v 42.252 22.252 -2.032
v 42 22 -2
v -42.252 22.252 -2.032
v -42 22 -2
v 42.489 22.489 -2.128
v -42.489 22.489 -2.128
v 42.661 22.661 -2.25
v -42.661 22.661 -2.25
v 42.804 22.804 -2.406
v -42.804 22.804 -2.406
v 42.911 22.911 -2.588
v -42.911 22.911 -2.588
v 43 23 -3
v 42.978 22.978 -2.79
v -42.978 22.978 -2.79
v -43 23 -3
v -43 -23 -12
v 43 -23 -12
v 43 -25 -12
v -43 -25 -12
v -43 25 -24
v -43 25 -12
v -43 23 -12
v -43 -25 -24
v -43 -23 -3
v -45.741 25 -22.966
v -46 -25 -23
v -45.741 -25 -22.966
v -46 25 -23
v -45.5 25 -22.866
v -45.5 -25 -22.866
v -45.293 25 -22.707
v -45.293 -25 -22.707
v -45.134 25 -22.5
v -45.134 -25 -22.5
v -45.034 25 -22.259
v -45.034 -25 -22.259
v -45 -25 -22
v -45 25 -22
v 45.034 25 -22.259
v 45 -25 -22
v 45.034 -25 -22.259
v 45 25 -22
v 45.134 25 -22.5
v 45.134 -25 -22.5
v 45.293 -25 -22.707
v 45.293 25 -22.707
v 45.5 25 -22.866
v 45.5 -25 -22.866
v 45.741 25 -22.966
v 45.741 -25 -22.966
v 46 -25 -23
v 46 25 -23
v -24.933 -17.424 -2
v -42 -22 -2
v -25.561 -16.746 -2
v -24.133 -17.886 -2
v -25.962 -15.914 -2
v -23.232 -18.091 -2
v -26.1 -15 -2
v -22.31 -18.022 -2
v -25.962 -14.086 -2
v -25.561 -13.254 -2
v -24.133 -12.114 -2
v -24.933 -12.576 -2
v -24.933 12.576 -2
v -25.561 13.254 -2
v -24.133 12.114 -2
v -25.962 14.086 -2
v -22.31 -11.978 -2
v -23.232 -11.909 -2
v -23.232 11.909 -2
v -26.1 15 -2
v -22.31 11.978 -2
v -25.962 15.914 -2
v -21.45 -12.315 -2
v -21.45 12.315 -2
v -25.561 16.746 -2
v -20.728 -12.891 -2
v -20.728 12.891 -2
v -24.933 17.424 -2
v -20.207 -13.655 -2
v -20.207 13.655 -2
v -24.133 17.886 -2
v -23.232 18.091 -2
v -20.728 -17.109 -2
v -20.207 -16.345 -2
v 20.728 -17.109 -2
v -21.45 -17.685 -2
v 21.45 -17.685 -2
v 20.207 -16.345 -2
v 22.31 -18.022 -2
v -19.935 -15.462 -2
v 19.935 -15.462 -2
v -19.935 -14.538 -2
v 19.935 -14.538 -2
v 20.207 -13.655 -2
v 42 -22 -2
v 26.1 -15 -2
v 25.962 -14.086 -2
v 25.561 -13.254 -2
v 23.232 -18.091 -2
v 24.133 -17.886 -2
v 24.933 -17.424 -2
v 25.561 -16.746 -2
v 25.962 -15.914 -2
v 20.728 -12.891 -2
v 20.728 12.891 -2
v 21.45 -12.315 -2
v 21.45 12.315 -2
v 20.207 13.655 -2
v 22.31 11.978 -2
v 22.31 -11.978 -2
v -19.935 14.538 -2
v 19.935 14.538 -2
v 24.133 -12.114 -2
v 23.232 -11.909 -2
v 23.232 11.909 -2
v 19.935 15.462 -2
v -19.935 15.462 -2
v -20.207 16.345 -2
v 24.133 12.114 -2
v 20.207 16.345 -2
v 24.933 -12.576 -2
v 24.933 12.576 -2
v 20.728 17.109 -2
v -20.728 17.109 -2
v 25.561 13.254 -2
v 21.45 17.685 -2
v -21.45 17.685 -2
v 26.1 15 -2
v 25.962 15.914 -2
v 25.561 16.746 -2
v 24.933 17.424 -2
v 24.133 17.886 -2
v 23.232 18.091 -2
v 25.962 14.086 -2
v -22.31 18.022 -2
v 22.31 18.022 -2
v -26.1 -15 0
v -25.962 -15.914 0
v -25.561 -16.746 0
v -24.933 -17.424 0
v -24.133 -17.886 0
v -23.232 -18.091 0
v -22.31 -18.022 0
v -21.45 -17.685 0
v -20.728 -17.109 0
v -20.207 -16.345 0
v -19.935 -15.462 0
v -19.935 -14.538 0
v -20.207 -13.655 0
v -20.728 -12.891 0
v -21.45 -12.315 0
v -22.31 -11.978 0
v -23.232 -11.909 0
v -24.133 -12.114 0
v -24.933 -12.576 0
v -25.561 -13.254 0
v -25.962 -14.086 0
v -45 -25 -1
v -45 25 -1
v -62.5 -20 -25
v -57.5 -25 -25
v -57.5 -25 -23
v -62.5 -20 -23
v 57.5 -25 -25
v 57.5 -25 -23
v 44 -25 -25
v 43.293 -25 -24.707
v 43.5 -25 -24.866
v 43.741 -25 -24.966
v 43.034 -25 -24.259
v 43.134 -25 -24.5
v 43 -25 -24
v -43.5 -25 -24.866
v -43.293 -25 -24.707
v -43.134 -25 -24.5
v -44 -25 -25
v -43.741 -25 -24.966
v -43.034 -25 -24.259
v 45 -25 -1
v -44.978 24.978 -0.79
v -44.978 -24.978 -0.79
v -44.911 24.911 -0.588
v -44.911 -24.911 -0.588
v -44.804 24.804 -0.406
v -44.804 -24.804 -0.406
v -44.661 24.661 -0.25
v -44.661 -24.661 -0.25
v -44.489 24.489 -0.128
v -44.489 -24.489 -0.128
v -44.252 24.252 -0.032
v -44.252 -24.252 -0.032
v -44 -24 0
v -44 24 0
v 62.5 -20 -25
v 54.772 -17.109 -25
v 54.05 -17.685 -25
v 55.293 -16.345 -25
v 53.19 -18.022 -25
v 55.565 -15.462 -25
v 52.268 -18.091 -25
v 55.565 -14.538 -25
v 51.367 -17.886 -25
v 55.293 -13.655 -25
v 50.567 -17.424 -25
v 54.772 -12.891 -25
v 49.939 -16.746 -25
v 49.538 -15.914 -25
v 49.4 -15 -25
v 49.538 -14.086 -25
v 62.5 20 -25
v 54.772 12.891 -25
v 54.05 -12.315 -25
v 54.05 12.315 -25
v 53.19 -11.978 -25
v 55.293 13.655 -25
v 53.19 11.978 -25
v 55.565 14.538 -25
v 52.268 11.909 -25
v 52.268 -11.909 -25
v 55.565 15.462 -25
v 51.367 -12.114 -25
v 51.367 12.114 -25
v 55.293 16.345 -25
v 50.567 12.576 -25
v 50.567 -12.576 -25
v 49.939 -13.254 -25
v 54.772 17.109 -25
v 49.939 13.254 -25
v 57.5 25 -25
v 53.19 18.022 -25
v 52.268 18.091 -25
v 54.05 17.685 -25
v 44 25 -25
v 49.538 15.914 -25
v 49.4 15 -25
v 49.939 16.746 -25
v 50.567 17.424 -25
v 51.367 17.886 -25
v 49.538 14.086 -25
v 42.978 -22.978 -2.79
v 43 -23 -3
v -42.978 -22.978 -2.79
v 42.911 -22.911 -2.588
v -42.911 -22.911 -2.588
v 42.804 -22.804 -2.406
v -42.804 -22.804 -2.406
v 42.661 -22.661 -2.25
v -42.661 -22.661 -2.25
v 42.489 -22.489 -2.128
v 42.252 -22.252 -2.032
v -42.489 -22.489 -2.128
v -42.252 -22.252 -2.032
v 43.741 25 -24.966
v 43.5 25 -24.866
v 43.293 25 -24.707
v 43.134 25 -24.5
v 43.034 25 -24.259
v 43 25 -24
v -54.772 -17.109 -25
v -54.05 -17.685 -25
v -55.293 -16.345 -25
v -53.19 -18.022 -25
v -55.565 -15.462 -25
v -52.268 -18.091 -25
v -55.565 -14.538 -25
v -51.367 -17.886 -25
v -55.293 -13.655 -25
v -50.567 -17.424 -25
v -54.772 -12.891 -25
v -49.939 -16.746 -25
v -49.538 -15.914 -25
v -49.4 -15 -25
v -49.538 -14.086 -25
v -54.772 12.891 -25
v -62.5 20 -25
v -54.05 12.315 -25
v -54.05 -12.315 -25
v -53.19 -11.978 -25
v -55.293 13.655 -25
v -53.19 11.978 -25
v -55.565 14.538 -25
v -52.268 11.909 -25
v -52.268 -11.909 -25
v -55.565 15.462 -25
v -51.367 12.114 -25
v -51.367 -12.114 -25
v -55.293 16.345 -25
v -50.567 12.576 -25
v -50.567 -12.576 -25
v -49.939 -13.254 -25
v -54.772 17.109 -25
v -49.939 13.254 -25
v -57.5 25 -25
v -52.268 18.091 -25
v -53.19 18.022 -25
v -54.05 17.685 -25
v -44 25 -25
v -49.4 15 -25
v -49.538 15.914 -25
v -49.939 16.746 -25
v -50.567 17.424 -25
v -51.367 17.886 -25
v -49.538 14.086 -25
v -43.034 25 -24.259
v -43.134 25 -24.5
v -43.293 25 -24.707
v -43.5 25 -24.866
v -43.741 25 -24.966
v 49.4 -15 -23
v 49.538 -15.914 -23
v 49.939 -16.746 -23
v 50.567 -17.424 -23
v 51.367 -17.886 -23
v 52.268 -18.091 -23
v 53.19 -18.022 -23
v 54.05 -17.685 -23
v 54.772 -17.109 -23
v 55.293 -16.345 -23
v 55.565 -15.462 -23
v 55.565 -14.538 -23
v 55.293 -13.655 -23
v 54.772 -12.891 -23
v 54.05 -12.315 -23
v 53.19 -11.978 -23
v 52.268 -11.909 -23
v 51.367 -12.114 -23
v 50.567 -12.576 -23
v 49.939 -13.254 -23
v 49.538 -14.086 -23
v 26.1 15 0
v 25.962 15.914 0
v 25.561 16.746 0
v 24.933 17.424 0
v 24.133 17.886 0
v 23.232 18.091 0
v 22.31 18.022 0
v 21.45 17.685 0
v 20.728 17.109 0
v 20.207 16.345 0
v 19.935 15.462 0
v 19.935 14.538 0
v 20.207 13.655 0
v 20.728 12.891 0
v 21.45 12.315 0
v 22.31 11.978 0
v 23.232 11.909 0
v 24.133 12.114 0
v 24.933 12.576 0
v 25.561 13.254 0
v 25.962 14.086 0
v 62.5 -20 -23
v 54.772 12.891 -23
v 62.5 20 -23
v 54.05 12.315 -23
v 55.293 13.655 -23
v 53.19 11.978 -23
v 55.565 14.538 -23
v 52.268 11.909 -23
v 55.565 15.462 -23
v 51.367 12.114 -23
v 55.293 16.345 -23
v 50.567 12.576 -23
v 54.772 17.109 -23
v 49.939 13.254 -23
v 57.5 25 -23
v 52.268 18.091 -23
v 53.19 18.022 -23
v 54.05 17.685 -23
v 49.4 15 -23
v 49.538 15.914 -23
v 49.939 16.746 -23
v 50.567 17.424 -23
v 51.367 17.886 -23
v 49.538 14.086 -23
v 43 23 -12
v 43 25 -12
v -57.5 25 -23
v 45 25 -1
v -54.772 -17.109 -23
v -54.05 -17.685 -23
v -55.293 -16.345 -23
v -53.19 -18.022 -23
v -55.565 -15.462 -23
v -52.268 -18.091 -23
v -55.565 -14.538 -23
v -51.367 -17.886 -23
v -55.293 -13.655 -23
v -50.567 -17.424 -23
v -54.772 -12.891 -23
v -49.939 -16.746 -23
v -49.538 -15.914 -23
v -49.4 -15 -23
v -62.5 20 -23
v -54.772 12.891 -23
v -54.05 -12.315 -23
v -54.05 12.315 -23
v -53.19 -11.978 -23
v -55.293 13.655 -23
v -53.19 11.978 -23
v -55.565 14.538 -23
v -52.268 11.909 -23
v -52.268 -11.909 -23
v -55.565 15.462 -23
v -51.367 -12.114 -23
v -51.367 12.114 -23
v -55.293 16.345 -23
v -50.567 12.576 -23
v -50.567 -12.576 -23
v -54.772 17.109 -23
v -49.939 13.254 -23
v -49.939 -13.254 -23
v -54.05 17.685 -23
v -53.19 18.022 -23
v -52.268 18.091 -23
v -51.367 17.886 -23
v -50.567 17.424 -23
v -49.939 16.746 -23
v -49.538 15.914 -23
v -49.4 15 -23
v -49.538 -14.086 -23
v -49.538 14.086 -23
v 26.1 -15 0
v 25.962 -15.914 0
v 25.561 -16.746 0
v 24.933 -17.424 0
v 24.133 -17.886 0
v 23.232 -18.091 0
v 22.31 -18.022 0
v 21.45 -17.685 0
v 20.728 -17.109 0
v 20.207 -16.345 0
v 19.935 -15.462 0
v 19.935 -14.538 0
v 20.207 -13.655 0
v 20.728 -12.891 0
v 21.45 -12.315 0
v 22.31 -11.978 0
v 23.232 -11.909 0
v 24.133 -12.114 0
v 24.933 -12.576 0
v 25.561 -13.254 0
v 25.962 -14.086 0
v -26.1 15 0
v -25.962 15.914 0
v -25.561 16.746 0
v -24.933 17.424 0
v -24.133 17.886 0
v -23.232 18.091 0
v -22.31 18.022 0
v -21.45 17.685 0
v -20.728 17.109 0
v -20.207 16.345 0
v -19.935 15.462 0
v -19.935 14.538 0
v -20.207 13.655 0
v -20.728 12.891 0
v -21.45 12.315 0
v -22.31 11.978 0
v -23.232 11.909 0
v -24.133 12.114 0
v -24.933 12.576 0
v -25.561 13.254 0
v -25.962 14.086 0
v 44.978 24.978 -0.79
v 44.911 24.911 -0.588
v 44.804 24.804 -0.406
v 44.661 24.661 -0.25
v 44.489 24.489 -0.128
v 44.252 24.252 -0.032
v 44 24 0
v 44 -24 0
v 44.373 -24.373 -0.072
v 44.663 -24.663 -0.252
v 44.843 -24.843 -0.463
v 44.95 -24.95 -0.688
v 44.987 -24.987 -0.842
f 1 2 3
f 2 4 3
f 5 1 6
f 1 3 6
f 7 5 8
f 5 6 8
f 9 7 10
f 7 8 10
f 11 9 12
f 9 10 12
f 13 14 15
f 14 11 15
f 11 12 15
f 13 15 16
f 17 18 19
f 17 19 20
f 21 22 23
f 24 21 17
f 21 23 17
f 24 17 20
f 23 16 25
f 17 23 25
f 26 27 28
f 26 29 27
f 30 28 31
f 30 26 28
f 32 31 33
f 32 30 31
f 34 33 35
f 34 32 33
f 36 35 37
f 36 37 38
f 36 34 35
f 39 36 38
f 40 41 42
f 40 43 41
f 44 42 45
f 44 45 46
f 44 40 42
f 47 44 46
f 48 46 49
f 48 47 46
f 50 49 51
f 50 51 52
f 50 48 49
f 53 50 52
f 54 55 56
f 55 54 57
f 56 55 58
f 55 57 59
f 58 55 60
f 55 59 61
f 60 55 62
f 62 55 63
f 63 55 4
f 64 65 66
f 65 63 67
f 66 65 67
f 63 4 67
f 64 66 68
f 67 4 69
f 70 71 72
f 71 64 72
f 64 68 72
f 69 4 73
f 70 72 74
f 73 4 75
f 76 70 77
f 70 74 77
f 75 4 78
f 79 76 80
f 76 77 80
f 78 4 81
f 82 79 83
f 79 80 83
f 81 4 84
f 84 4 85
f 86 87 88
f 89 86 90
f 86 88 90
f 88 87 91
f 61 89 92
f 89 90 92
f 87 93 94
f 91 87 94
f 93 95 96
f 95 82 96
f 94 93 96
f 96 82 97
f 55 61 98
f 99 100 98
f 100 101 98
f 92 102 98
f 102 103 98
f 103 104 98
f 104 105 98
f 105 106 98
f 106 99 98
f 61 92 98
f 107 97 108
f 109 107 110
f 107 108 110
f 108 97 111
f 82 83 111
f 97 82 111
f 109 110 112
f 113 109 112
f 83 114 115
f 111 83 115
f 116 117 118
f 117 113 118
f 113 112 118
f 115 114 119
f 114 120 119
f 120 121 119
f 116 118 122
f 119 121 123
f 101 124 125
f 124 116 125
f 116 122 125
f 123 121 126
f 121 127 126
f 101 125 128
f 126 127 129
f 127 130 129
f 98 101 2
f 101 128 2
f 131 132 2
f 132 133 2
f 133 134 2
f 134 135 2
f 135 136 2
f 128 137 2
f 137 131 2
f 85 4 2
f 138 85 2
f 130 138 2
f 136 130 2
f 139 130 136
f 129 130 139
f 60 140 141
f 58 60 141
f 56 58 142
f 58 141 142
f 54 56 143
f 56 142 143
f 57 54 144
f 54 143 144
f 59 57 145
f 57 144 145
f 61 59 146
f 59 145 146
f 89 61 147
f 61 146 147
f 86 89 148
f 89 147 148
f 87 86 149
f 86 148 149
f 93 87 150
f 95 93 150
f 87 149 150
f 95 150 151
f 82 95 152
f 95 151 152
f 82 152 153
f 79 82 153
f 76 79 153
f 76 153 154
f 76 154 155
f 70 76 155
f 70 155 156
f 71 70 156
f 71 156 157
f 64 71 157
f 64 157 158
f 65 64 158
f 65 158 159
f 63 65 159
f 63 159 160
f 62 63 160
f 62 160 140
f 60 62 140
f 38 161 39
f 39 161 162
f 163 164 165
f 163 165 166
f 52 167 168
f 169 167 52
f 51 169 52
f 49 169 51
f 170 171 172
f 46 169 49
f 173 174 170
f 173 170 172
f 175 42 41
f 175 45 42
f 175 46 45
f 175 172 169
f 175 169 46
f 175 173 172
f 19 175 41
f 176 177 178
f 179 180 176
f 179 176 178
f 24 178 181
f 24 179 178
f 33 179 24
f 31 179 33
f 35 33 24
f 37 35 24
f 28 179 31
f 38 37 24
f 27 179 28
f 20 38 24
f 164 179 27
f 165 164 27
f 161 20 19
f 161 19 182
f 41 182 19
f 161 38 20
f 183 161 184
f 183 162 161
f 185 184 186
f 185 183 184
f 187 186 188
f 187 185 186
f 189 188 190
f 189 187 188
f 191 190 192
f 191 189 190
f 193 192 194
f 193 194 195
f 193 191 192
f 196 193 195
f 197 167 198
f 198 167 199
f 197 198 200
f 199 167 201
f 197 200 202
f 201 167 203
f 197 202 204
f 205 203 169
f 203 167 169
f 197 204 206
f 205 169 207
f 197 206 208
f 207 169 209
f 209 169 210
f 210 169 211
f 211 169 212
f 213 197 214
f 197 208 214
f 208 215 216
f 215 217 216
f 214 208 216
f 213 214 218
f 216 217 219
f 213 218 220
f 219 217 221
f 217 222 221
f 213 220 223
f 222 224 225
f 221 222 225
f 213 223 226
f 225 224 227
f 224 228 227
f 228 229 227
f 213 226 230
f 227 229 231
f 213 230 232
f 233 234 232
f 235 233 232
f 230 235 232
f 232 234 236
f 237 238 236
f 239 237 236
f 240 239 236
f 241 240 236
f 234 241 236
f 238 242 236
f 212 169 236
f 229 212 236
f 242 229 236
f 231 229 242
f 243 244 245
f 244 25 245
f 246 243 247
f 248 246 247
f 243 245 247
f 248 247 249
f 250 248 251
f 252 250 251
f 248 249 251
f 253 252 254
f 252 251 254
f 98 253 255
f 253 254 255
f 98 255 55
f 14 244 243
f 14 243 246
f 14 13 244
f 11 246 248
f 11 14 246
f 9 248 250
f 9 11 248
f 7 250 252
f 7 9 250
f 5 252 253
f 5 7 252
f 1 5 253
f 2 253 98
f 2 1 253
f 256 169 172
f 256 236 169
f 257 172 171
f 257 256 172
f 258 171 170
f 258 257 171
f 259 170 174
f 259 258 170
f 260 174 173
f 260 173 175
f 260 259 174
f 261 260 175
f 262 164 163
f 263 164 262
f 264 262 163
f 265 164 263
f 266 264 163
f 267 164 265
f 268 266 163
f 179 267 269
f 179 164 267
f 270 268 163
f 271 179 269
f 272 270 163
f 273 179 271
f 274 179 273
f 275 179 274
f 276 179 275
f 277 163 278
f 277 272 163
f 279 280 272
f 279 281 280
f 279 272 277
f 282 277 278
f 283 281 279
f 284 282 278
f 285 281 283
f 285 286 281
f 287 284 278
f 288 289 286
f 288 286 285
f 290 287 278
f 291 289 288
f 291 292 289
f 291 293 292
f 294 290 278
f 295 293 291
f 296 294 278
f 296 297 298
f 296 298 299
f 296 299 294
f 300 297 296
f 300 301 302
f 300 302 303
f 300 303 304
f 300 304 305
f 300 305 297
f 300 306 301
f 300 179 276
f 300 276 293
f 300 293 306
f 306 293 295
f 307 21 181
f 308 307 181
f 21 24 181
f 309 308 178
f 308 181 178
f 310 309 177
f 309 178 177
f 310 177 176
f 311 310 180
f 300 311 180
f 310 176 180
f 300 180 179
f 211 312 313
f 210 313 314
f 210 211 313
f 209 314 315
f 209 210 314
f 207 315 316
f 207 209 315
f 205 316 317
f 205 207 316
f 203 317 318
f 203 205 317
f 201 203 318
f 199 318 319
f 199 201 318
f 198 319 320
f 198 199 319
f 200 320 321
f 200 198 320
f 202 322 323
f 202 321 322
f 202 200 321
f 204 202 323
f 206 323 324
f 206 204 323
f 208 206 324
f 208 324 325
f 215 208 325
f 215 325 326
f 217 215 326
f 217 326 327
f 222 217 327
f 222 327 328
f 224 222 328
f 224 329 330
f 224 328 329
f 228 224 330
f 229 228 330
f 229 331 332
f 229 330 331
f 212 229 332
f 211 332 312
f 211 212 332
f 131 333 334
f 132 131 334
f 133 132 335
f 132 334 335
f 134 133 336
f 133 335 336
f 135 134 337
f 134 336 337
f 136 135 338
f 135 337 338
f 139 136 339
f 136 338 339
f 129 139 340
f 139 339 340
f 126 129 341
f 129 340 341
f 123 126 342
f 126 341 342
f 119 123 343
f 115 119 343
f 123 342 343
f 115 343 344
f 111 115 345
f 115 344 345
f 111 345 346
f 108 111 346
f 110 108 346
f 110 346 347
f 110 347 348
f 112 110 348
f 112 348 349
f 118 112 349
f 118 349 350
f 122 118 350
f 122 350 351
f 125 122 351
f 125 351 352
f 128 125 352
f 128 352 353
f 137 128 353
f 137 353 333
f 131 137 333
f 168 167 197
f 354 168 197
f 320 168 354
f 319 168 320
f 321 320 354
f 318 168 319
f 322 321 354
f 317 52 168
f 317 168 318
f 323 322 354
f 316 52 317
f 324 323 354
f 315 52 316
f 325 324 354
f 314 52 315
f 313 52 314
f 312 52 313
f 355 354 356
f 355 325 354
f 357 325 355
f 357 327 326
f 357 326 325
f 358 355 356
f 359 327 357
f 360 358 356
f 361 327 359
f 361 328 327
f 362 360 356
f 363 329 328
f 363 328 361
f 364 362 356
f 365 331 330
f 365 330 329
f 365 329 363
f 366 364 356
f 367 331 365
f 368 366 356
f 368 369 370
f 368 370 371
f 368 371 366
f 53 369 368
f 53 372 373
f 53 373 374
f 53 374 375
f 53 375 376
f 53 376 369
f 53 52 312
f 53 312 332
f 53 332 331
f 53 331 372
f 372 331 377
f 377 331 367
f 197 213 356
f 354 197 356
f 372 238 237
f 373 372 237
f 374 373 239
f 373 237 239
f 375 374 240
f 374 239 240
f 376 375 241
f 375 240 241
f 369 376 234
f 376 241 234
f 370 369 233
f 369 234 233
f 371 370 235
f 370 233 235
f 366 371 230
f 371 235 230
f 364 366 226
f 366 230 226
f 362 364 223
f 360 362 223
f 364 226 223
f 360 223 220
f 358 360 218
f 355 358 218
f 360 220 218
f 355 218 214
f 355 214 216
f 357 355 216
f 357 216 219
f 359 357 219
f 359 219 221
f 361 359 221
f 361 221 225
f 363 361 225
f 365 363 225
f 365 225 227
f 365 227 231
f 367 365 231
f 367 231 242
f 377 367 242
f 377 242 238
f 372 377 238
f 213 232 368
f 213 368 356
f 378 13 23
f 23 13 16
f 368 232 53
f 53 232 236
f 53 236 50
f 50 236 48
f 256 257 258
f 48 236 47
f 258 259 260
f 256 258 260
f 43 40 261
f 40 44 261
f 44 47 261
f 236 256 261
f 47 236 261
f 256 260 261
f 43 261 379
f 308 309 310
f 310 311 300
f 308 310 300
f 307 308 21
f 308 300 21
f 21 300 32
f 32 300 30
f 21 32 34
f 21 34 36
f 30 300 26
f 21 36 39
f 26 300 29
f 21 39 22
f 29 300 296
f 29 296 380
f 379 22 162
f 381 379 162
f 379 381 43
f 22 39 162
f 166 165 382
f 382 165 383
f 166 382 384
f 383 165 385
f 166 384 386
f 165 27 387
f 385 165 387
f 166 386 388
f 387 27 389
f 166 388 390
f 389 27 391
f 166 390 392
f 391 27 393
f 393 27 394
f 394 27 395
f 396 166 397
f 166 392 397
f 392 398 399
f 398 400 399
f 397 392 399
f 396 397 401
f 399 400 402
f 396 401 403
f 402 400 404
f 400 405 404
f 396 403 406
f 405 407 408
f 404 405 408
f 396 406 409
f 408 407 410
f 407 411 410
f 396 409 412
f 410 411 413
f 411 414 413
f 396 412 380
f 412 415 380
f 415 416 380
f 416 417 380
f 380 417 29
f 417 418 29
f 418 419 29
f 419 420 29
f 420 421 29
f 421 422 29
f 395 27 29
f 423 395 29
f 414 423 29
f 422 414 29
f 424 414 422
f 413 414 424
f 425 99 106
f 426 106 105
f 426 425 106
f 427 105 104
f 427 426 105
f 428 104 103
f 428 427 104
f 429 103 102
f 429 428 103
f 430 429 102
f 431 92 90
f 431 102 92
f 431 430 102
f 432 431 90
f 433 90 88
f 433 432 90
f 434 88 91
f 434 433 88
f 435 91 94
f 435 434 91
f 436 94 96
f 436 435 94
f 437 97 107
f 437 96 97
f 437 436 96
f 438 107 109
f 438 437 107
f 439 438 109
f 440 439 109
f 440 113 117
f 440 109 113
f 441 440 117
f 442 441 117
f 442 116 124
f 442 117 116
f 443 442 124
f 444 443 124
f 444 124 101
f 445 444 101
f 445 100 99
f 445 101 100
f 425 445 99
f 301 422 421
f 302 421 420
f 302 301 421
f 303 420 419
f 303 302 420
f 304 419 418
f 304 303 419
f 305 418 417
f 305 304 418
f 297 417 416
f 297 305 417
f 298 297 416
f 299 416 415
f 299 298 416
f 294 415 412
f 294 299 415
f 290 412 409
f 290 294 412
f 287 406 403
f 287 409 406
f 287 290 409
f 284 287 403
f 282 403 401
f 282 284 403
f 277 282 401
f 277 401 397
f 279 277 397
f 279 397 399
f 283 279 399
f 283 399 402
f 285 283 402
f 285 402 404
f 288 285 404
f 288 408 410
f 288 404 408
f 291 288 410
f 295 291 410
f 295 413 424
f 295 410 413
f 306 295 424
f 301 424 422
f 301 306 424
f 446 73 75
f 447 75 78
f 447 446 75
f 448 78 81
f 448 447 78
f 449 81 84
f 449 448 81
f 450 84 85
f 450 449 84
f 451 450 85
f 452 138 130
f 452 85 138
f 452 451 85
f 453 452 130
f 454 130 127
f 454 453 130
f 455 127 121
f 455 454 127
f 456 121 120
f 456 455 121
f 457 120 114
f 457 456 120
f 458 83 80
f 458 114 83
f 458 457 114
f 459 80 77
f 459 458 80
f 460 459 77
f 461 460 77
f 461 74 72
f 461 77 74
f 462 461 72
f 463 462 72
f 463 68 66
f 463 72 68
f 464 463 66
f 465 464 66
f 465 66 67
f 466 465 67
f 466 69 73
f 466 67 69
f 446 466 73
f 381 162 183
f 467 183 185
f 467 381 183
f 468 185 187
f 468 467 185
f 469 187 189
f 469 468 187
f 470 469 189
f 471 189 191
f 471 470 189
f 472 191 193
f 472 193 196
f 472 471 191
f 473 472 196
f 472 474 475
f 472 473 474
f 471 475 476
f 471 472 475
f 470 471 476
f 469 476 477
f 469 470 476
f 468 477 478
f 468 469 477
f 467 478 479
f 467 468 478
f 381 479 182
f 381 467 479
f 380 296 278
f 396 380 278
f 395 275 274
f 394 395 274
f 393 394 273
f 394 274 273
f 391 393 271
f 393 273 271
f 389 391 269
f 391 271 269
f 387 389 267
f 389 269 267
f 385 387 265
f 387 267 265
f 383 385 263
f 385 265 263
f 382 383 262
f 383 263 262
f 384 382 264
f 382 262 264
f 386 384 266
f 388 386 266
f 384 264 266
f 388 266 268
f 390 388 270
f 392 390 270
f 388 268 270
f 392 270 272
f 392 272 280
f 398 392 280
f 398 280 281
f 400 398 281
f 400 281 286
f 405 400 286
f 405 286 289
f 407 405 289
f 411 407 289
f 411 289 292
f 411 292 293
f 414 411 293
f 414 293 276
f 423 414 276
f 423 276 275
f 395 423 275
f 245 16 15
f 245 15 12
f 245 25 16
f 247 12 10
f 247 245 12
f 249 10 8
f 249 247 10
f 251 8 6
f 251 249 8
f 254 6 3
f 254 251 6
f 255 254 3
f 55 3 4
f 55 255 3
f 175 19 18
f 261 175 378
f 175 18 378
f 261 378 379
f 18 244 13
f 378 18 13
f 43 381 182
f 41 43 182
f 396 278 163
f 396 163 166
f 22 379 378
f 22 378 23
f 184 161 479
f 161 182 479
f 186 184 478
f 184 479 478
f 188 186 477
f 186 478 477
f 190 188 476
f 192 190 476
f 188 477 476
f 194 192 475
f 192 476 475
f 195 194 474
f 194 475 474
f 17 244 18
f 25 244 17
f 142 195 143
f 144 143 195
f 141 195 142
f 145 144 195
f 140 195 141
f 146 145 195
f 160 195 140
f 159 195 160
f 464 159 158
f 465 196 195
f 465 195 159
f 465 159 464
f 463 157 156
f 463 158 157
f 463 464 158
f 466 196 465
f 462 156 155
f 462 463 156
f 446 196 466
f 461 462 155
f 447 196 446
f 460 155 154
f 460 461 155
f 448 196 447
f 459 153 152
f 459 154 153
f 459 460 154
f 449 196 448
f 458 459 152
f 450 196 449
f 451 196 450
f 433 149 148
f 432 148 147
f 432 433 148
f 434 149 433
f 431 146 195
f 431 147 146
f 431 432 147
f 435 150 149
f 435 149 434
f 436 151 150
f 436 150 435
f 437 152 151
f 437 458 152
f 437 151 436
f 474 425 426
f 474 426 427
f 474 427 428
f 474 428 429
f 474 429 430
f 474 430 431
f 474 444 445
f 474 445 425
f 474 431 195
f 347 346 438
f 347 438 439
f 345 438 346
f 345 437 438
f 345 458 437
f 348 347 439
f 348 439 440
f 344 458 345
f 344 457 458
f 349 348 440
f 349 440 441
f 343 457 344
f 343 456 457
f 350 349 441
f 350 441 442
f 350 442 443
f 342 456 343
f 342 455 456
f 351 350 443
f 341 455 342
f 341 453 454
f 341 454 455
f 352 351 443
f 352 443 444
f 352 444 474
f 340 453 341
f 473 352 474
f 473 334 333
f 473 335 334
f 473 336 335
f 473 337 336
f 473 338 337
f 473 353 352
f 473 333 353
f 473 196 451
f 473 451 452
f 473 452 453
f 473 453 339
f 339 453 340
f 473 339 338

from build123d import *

# Parameters (mm, degrees)
SKETCH_1_W               = 90
SKETCH_1_H               = 50
SM_BASE_FLANGE_1_DEPTH   = 2
EXTRUDE_1_DEPTH          = 23
SKETCH_5_3_W             = 86
SKETCH_5_3_H             = 2
EXTRUDE_2_DEPTH          = 10
SKETCH_10_W              = 2
SKETCH_10_H              = 50
EXTRUDE_3_DEPTH          = 17.5
CUT_EXTRUDE_1_DEPTH      = 72.807033082
FILLET_1_R               = 1
SKETCH_12_R              = 3.1
CUT_EXTRUDE_2_DEPTH      = 72.807033082
SKETCH_13_R              = 3.1
CUT_EXTRUDE_3_DEPTH      = 72.807033082
MIRROR_5_COPY_1_SKETCH_R = 3.1
MIRROR_5_COPY_1_DEPTH    = 72.807033082
MIRROR_5_COPY_2_SKETCH_R = 3.1
MIRROR_5_COPY_2_DEPTH    = 72.807033082


# Sheet-metal steps are written as plain solids
with BuildPart() as part:
    # Sketch 1 → 基体-法兰1 (new body)
    with BuildSketch(Plane.XY):
        Rectangle(SKETCH_1_W, SKETCH_1_H)
    extrude(amount=-SM_BASE_FLANGE_1_DEPTH)

    # 草图5 → 凸台-拉伸1 (add)
    with BuildSketch(Plane(origin=(0, 0, -2), x_dir=(-1, 0, 0), z_dir=(0, 0, -1))):
        Polygon((-43, 25), (-45, 25), (-45, -25), (-43, -25), (-43, -23), (-43, 23), align=None)
        Polygon((45, 25), (43, 25), (43, 23), (43, -23), (43, -25), (45, -25), align=None)
    extrude(amount=EXTRUDE_1_DEPTH)

    # 草图5<3> → 凸台-拉伸2 (add)
    with BuildSketch(Plane(origin=(0, 0, -2), x_dir=(-1, 0, 0), z_dir=(0, 0, -1))):
        with Locations((0, 24)):
            Rectangle(SKETCH_5_3_W, SKETCH_5_3_H)
        with Locations((0, -24)):
            Rectangle(SKETCH_5_3_W, SKETCH_5_3_H)
    extrude(amount=EXTRUDE_2_DEPTH)

    # 草图10 → 凸台-拉伸3 (add)
    with BuildSketch(Plane.ZY.offset(45)):
        with Locations((-24, 0)):
            Rectangle(SKETCH_10_W, SKETCH_10_H)
    extrude_3 = extrude(amount=EXTRUDE_3_DEPTH)

    # 草图11 → 切除-拉伸1 (cut, through all)
    with BuildSketch(Plane(origin=(0, 0, -25), x_dir=(-1, 0, 0), z_dir=(0, 0, -1))):
        Polygon((57.5, 25), (62.5, 20), (62.5, 25), align=None)
        Polygon((57.5, -25), (62.5, -20), (62.5, -25), align=None)
    cut_extrude_1 = extrude(amount=-CUT_EXTRUDE_1_DEPTH, mode=Mode.SUBTRACT)

    # 镜向3: 凸台-拉伸3, 切除-拉伸1 across plane
    add(extrude_3.mirror(Plane(origin=(0, 0, 0), x_dir=(0, 0, 1), z_dir=(1, 0, 0))))
    add(cut_extrude_1.mirror(Plane(origin=(0, 0, 0), x_dir=(0, 0, 1), z_dir=(1, 0, 0))), mode=Mode.SUBTRACT)

    # 圆角1
    fillet_1_edges = [part.edges().sort_by_distance(p)[0] for p in [
        (-43, 0, -25),
        (-43, 0, -2),
        (43, 0, -2),
        (0, 23, -2),
        (0, -23, -2),
        (-45, 0, -23),
        (45, 0, -23),
        (0, 25, 0),
        (45, 0, 0),
        (0, -25, 0),
        (-45, 0, 0),
        (43, 0, -25),
    ]]
    fillet(fillet_1_edges, radius=FILLET_1_R)

    # 草图12 → 切除-拉伸2 (cut, through all)
    with BuildSketch(Plane(origin=(0, 0, -25), x_dir=(-1, 0, 0), z_dir=(0, 0, -1))):
        with Locations((-52.5, 15)):
            Circle(SKETCH_12_R)
    cut_extrude_2 = extrude(amount=-CUT_EXTRUDE_2_DEPTH, mode=Mode.SUBTRACT)

    # 草图13 → 切除-拉伸3 (cut, through all)
    with BuildSketch(Plane.XY):
        with Locations((23, 15)):
            Circle(SKETCH_13_R)
    cut_extrude_3 = extrude(amount=-CUT_EXTRUDE_3_DEPTH, mode=Mode.SUBTRACT)

    # 镜向4: 切除-拉伸2, 切除-拉伸3 across plane
    add(cut_extrude_2.mirror(Plane.ZX), mode=Mode.SUBTRACT)
    add(cut_extrude_3.mirror(Plane.ZX), mode=Mode.SUBTRACT)

    # 镜向5: 切除-拉伸2, 切除-拉伸3 across plane
    add(cut_extrude_2.mirror(Plane(origin=(0, 0, 0), x_dir=(0, 0, 1), z_dir=(1, 0, 0))), mode=Mode.SUBTRACT)
    add(cut_extrude_3.mirror(Plane(origin=(0, 0, 0), x_dir=(0, 0, 1), z_dir=(1, 0, 0))), mode=Mode.SUBTRACT)

    # 镜向5 copy 1 sketch → 镜向5 copy 1 (cut, through all)
    with BuildSketch(Plane(origin=(0, 0, -25), x_dir=(1, 0, 0), z_dir=(0, 0, -1))):
        with Locations((-52.5, 15)):
            Circle(MIRROR_5_COPY_1_SKETCH_R)
    extrude(amount=-MIRROR_5_COPY_1_DEPTH, mode=Mode.SUBTRACT)

    # 镜向5 copy 2 sketch → 镜向5 copy 2 (cut, through all)
    with BuildSketch(Plane(origin=(0, 0, 0), x_dir=(-1, 0, 0), z_dir=(0, 0, 1))):
        with Locations((23, 15)):
            Circle(MIRROR_5_COPY_2_SKETCH_R)
    extrude(amount=-MIRROR_5_COPY_2_DEPTH, mode=Mode.SUBTRACT)


solid = part.part
